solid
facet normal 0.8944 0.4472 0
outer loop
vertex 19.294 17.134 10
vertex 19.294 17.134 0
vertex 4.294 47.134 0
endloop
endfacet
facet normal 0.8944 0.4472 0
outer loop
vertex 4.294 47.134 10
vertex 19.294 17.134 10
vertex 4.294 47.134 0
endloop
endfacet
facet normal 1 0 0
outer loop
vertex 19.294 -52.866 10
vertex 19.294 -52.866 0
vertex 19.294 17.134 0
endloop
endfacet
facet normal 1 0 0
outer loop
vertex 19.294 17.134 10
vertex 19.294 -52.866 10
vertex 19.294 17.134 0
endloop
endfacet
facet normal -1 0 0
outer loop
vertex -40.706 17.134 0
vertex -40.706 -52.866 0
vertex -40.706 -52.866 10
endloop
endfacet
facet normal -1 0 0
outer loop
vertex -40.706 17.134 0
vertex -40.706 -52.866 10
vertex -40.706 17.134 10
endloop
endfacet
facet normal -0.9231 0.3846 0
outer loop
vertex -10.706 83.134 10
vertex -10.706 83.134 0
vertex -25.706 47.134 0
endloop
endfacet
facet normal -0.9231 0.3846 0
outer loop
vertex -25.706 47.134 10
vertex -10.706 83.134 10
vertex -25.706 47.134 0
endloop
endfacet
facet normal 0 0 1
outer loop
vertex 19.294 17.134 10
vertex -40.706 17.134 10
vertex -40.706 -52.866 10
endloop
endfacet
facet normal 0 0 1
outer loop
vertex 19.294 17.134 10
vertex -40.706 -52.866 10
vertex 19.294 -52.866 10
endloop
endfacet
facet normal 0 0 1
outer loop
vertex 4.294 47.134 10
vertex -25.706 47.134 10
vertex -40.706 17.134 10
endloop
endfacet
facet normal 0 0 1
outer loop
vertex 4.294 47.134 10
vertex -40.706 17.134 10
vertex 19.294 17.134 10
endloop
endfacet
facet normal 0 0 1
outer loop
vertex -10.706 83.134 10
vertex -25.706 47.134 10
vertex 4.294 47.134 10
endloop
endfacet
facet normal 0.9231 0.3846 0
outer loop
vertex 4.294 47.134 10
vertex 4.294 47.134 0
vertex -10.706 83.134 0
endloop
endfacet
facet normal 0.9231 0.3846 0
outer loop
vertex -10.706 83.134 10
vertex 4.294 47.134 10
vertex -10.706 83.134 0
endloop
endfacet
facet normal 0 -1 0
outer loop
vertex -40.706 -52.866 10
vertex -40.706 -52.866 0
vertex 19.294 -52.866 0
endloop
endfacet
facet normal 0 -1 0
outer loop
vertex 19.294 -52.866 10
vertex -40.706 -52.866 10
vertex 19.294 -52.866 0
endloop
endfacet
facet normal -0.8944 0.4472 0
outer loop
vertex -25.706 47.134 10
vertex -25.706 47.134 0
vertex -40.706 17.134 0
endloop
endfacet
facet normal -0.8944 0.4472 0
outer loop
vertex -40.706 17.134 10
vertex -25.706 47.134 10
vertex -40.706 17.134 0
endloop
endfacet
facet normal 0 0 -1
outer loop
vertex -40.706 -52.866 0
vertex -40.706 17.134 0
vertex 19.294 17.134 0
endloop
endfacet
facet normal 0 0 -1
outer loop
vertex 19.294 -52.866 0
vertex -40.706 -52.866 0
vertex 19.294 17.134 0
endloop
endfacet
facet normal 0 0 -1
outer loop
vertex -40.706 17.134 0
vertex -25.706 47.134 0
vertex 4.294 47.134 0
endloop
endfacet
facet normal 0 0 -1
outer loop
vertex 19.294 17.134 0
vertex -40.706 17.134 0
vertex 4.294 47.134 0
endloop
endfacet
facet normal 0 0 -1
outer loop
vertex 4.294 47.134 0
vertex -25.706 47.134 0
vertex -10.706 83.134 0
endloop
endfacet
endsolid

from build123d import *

# Parameters (mm, degrees)
F0_W     = 60
F0_H     = 70
F1_DEPTH = 10


with BuildPart() as f1:
    # F0 (on Top) → F1 (new body)
    with BuildSketch(Plane.XY):
        Polygon((-10.705919, 83.133888), (-25.705919, 47.133888), (4.294081, 47.133888), align=None)
        Polygon((-25.705919, 47.133888), (-40.705919, 17.133888), (19.294081, 17.133888), (4.294081, 47.133888), align=None)
        with Locations((-10.705919, -17.866112)):
            Rectangle(F0_W, F0_H)
    extrude(amount=F1_DEPTH)


solid = f1.part
